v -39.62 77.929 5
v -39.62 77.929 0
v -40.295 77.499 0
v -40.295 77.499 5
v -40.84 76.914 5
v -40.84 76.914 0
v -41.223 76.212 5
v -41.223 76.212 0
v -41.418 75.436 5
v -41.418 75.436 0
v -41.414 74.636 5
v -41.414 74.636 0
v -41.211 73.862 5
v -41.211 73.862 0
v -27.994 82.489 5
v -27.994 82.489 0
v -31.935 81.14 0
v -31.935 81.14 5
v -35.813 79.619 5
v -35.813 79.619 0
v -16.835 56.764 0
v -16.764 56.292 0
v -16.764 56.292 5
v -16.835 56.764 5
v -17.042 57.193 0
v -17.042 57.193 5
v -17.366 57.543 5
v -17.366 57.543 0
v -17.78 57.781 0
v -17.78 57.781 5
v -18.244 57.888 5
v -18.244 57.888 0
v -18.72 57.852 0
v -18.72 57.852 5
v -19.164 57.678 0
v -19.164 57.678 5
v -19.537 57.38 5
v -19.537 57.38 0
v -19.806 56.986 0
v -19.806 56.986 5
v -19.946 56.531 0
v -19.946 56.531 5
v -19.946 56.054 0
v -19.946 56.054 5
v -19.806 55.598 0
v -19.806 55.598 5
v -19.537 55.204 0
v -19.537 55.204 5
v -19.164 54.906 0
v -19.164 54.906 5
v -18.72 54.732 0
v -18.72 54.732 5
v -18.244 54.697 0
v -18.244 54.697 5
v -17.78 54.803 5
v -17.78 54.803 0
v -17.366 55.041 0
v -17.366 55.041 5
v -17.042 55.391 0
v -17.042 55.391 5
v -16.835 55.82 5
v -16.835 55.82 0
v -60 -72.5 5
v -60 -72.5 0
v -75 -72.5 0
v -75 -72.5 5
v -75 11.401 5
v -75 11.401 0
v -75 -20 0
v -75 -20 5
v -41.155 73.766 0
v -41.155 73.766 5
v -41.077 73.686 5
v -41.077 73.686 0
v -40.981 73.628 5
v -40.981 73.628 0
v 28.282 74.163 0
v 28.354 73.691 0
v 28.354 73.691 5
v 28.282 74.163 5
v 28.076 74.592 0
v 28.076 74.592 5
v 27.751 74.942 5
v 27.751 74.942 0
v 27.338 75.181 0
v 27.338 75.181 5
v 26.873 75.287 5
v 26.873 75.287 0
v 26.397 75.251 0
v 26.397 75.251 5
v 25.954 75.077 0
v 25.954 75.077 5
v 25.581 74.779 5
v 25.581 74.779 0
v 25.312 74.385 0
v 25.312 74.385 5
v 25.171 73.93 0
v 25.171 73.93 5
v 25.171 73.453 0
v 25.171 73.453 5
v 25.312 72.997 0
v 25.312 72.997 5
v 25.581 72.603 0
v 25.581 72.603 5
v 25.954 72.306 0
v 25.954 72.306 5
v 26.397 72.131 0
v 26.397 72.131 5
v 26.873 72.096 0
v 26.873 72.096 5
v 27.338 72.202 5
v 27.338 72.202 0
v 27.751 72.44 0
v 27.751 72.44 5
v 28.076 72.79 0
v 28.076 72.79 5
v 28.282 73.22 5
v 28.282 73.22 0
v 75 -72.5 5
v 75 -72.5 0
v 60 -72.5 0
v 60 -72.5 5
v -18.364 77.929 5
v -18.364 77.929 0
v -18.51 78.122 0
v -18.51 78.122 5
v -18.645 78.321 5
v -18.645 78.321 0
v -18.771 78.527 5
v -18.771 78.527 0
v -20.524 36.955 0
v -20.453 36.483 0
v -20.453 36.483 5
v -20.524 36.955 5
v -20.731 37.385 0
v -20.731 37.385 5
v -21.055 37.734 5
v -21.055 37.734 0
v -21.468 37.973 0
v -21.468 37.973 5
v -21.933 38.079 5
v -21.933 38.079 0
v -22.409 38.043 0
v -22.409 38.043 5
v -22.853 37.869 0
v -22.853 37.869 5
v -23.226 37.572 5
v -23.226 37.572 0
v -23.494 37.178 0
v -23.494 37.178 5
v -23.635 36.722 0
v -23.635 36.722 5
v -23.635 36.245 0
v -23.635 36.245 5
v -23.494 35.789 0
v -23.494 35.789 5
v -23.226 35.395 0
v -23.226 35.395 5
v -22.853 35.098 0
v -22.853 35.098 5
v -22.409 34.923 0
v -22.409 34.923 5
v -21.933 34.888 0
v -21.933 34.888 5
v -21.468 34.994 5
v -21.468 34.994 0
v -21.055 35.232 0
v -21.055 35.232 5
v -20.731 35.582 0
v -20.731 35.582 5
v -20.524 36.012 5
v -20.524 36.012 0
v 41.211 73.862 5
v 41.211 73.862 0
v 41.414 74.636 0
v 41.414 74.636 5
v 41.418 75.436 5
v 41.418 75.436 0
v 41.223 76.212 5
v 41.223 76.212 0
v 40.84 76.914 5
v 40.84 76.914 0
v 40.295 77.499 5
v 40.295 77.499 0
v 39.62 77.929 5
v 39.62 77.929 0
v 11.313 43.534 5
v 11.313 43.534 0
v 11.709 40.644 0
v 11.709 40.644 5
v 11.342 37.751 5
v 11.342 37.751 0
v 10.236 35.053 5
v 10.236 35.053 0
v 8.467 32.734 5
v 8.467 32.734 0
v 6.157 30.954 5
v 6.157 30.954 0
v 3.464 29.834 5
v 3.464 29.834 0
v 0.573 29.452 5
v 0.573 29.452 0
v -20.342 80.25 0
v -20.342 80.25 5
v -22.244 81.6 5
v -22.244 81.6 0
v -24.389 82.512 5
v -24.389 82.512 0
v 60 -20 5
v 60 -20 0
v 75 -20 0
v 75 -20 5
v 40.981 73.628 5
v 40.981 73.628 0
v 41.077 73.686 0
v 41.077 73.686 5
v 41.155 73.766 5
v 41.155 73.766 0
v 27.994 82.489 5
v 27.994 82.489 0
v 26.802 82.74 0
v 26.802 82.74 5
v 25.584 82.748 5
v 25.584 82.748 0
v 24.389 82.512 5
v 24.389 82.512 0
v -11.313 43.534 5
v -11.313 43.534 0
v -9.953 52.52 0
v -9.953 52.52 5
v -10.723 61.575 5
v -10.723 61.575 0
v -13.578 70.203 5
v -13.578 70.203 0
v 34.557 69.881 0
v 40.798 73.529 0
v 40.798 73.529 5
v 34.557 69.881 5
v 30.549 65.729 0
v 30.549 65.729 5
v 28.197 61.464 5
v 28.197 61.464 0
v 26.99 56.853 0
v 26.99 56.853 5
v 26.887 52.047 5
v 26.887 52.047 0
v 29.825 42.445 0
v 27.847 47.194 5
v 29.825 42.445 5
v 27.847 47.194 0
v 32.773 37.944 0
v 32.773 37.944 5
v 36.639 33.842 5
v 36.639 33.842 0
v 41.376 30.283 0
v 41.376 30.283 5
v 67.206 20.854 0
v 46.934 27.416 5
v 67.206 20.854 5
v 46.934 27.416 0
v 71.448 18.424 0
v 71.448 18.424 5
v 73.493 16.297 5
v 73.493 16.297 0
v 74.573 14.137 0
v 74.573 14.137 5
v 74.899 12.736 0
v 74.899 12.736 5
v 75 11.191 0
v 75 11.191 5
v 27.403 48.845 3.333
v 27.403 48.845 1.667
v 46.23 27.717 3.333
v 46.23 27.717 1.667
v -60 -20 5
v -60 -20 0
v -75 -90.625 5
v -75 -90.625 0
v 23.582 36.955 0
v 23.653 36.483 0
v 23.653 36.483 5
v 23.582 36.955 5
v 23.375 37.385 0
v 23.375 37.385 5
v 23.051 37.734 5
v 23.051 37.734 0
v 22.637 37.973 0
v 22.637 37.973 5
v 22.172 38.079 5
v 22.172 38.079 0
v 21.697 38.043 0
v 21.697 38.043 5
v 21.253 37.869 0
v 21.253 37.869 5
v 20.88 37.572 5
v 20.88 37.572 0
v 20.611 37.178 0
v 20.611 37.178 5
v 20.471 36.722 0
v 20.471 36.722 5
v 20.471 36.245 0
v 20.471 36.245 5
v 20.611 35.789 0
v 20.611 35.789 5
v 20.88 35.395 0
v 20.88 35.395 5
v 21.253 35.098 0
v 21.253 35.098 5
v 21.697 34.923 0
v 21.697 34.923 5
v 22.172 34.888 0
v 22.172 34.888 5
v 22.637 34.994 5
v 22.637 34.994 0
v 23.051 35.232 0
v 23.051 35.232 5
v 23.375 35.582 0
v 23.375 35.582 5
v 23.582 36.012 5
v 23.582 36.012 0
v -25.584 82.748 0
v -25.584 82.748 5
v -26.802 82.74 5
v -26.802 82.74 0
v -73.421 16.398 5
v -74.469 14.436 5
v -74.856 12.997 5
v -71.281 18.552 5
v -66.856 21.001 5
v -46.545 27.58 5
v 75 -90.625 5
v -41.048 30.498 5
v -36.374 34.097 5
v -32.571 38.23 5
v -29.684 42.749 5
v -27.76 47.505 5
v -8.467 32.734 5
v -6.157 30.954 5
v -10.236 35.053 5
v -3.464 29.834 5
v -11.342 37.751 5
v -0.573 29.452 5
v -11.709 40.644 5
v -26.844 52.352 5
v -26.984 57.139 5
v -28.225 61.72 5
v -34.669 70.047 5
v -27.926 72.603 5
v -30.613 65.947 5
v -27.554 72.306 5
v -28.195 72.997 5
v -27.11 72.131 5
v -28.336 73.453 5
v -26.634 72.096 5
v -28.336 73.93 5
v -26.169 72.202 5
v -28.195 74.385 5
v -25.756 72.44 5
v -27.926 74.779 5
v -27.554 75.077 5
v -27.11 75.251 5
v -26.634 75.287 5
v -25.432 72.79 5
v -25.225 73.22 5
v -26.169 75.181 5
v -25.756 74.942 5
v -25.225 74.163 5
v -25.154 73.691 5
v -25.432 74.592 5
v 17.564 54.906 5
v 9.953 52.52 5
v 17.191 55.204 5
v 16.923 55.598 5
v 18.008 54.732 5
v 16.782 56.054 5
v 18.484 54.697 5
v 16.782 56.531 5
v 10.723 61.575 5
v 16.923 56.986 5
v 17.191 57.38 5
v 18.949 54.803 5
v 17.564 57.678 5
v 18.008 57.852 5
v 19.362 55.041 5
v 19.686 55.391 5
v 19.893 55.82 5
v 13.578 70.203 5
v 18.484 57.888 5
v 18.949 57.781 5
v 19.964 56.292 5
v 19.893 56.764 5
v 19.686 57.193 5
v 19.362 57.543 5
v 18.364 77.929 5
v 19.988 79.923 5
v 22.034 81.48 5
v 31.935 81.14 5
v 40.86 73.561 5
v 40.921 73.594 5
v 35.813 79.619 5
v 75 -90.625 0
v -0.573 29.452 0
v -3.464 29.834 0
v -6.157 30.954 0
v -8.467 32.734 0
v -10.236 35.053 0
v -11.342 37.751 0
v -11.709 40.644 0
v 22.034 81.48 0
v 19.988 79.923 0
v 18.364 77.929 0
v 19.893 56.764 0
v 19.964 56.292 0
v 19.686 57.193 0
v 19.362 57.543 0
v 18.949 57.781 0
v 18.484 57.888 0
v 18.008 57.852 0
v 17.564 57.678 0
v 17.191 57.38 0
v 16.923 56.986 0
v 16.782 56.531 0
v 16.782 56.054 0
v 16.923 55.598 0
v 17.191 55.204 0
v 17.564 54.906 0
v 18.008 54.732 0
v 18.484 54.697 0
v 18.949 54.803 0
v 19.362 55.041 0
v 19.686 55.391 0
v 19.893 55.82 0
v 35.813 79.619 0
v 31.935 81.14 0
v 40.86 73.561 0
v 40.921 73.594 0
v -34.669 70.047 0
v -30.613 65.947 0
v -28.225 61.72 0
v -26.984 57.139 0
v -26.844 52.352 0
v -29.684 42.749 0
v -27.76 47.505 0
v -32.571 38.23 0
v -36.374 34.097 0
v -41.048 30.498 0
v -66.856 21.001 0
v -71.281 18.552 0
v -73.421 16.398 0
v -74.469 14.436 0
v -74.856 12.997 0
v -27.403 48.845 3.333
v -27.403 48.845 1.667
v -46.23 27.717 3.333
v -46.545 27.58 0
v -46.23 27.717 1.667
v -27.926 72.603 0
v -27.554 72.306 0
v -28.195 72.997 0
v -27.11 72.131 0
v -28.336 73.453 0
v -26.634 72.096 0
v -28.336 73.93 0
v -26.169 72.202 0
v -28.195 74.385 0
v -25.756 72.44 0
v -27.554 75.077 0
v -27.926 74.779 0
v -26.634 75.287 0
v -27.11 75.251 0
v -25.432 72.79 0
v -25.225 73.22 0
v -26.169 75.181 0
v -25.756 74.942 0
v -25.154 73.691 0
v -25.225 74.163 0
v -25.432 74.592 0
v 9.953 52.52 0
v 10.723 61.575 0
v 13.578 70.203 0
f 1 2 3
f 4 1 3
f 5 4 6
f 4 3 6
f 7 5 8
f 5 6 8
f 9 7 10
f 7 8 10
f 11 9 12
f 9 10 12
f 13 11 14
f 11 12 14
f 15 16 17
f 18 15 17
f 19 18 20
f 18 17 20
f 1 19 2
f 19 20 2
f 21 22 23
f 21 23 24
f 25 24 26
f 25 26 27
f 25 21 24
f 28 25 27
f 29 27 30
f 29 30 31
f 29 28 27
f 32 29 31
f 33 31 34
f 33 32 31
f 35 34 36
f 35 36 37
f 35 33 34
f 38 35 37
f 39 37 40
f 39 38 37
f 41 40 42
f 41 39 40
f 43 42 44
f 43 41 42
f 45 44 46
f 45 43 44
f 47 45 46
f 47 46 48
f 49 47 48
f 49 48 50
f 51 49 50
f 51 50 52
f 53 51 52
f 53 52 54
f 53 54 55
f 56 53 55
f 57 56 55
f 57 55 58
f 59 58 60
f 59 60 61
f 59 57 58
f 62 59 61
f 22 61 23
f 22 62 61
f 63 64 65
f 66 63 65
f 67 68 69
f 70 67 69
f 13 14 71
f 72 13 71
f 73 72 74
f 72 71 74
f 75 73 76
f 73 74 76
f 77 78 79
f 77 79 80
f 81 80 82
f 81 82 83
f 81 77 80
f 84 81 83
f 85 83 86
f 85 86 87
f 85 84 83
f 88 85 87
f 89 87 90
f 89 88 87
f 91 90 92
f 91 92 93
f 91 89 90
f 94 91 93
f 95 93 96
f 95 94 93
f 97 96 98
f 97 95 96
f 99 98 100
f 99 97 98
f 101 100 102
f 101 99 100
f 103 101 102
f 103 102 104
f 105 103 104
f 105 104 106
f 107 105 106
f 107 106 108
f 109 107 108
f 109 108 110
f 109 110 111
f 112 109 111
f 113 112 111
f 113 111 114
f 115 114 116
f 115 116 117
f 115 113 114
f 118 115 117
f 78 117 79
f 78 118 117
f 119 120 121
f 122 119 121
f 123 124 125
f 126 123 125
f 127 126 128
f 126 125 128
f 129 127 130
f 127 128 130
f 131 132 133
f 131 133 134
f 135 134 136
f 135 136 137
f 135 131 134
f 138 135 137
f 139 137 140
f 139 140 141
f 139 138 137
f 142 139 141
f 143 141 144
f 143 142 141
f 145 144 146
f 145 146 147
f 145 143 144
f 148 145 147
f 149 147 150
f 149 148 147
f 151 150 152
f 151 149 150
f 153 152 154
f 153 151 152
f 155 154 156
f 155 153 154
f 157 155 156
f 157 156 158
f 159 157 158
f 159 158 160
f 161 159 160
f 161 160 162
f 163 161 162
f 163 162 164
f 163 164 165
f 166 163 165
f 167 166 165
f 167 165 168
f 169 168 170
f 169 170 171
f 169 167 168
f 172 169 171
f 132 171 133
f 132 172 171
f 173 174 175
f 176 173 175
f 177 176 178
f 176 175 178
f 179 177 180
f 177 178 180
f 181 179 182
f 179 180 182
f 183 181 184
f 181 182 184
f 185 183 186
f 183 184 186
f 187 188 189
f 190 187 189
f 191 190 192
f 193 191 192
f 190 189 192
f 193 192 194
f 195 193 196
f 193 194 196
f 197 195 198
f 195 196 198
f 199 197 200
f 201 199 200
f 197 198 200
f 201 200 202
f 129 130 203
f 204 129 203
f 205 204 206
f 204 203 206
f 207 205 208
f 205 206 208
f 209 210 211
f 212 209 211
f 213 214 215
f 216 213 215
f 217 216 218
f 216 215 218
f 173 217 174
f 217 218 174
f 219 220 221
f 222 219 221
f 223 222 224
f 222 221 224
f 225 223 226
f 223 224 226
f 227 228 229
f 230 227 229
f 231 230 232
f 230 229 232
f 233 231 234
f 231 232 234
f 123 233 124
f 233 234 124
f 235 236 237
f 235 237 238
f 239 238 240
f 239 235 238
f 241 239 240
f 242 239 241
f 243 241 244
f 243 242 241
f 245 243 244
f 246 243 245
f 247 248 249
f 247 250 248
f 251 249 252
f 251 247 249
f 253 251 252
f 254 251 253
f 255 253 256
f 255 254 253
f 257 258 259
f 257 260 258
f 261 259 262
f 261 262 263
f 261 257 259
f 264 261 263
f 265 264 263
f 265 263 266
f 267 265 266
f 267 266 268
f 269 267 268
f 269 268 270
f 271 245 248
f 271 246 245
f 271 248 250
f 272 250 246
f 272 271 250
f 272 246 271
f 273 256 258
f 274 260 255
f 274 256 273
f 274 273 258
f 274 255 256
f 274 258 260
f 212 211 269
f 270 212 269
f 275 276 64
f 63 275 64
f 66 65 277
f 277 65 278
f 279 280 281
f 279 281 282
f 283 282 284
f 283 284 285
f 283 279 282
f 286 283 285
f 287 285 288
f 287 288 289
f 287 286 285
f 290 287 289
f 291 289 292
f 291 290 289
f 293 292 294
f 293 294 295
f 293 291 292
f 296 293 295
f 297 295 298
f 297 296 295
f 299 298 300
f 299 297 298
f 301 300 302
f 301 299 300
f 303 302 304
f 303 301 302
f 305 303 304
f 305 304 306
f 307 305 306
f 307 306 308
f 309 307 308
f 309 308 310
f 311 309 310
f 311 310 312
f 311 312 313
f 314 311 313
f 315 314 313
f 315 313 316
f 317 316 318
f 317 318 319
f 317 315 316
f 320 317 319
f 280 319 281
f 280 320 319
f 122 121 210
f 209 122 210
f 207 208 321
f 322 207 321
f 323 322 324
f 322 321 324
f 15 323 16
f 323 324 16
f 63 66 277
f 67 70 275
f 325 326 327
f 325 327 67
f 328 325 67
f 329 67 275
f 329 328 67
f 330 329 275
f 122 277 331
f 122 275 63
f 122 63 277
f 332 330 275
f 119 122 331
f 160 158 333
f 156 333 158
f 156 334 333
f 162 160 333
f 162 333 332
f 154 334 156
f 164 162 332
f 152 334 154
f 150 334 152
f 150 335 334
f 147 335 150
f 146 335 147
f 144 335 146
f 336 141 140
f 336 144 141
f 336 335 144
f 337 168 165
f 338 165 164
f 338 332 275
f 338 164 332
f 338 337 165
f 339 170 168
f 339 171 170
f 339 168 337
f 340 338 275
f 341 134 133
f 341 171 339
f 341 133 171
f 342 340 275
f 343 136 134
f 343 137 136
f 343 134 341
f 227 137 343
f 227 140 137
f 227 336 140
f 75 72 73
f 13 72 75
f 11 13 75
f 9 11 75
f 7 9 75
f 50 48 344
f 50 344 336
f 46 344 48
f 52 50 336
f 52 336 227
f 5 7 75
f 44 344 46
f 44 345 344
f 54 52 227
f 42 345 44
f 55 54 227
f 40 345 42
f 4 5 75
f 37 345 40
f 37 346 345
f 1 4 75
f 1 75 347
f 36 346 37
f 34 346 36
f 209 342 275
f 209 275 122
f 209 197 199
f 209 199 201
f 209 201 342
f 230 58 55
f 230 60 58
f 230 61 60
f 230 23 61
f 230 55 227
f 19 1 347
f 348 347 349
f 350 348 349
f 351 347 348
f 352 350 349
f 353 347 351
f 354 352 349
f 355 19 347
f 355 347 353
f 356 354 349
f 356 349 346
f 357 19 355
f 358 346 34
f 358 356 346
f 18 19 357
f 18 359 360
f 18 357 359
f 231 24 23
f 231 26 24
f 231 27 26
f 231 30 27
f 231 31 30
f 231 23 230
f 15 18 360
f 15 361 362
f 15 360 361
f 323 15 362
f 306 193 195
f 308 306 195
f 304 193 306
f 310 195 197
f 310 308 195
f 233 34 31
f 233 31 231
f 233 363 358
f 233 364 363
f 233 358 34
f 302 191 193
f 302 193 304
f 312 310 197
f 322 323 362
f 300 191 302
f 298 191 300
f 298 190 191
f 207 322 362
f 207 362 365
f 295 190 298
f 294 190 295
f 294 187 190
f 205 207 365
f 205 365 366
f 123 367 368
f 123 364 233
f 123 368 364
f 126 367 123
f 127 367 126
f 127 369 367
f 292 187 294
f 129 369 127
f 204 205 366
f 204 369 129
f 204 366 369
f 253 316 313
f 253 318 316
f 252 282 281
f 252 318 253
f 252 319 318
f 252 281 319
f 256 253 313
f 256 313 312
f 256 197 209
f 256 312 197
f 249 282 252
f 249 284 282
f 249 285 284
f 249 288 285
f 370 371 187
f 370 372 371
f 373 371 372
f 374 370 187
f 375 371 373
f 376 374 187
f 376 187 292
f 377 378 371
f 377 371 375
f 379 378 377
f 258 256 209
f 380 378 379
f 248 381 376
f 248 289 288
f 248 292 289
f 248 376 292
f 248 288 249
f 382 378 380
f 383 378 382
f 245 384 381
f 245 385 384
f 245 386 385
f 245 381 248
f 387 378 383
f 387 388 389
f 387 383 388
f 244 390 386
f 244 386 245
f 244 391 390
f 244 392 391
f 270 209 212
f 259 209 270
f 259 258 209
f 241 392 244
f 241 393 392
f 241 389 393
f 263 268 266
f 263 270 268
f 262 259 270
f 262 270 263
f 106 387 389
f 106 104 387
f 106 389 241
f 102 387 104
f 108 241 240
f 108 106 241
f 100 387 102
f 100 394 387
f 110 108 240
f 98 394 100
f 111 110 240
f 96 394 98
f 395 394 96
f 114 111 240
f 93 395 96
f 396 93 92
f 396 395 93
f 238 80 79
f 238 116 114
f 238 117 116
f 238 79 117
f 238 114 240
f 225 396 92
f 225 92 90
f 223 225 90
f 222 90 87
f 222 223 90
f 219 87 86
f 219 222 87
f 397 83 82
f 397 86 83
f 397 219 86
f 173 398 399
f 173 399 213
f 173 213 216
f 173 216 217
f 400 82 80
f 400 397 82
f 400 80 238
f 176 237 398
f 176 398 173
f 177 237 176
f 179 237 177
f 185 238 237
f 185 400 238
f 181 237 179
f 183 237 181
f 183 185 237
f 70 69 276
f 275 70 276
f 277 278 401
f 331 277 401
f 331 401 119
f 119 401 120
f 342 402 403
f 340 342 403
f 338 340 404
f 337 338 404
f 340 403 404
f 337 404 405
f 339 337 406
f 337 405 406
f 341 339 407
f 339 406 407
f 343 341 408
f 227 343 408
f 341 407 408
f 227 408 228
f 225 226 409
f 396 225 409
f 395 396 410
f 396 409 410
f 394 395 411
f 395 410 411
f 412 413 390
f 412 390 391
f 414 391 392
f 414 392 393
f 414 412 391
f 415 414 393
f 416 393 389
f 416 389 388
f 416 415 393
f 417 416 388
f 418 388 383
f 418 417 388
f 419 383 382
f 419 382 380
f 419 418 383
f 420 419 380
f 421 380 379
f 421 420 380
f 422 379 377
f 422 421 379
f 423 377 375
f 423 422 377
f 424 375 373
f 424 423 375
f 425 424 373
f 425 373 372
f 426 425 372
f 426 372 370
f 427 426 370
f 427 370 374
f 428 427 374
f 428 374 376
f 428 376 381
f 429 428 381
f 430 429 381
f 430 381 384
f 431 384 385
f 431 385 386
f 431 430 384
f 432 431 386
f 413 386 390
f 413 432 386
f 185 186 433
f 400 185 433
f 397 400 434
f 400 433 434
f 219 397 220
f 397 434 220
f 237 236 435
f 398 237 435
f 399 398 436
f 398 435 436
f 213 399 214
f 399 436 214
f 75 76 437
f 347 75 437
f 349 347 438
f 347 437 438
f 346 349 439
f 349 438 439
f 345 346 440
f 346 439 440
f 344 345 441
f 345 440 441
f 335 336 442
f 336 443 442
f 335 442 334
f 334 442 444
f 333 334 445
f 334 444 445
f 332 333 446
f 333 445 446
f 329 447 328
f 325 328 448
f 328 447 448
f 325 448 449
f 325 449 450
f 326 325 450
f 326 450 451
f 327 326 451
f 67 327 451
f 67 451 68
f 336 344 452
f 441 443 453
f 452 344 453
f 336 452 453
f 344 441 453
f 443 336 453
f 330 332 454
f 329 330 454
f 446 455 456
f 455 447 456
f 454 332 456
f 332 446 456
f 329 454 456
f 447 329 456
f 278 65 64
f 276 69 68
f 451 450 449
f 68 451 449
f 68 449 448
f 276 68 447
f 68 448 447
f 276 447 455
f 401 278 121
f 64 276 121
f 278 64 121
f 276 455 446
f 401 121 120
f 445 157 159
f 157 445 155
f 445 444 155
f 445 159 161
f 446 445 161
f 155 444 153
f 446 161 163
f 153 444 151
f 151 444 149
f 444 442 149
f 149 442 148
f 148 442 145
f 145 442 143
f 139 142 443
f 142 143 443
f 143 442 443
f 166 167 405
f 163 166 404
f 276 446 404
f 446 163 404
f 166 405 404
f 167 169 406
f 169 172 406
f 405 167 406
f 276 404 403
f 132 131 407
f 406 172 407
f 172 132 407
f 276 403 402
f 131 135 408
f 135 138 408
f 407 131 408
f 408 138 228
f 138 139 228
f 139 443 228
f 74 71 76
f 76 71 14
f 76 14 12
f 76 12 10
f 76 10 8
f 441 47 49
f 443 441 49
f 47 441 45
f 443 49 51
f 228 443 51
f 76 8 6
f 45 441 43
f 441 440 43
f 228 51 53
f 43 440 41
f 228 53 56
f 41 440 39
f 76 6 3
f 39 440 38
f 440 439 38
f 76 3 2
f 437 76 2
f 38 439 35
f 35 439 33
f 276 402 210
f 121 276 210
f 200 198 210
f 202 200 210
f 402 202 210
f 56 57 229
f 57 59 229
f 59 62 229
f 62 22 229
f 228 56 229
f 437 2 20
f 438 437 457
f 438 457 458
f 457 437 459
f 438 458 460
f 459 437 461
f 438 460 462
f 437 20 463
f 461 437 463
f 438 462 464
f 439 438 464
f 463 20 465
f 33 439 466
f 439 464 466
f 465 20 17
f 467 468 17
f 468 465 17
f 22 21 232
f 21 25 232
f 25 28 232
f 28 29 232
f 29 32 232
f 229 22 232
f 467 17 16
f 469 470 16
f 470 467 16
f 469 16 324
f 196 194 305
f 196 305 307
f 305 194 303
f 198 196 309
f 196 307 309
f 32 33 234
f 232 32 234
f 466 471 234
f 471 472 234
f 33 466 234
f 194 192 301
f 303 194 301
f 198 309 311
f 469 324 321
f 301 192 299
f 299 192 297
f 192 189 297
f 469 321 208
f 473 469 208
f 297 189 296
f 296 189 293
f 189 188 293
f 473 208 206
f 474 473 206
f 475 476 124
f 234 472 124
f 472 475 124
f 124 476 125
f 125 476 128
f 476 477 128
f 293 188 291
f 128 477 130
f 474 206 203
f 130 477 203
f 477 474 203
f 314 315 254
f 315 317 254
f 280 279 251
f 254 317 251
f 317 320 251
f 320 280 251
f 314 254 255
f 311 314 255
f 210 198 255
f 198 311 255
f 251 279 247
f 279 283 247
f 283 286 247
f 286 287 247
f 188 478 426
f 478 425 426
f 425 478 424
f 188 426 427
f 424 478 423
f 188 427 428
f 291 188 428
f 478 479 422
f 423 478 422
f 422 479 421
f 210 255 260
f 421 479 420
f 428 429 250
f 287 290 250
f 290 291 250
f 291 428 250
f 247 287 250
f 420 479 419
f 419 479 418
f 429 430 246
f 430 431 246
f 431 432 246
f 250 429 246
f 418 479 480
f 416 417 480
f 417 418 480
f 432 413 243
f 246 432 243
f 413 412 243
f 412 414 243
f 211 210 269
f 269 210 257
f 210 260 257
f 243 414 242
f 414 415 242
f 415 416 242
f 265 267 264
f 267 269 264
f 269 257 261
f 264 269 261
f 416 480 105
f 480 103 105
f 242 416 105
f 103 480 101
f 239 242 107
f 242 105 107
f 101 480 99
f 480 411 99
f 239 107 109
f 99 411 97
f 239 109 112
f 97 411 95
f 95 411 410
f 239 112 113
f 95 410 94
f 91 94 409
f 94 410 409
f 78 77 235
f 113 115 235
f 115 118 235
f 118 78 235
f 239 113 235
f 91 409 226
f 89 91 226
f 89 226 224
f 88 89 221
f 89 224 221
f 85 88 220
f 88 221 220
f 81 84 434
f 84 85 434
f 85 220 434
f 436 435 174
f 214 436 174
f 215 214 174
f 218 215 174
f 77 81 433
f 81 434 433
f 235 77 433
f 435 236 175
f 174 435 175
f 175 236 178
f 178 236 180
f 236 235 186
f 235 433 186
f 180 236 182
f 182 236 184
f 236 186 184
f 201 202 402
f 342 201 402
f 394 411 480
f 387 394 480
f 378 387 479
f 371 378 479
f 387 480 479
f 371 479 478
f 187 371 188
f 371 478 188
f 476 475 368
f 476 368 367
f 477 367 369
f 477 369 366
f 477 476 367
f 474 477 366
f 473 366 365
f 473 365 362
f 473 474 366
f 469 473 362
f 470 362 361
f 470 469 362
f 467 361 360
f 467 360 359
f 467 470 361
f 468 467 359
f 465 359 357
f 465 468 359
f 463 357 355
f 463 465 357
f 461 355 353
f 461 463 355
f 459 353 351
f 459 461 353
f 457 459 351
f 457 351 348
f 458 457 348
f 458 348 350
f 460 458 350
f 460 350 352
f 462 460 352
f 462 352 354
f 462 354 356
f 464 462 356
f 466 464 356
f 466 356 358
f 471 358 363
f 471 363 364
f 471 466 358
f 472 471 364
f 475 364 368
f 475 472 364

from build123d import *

# Parameters (mm, degrees)
SKETCH1_R           = 1.6
BOSS_EXTRUDE1_DEPTH = 5


with BuildPart() as part:
    # Sketch1 → Boss-Extrude1 (new body)
    with BuildSketch(Plane.XY):
        with BuildLine():
            Line((-75, -72.5), (-75, -90.625))
            Line((-75, -90.625), (75, -90.625))
            Line((75, -90.625), (75, -72.5))
            Line((75, -72.5), (60, -72.5))
            Line((60, -72.5), (60, -20))
            Line((60, -20), (75, -20))
            Line((75, -20), (75, 11.191407718))
            add(Edge.make_bspline(
                [(40.797859307, 73.529184669), (29.113413748, 68.584091893), (21.698756749, 49.837173387), (43.872198756, 22.538291001), (75.106478131, 22.355404036), (75, 11.191407718)],
                knots=[0.187825193, 0.187825193, 0.187825193, 0.187825193, 0.468621415, 0.712802941, 1, 1, 1, 1], degree=3))
            ThreePointArc((40.797859307, 73.529184669), (40.890658025, 73.576842128), (40.981293421, 73.628495399))
            ThreePointArc((40.981293421, 73.628495399), (41.118145392, 73.723771319), (41.210746684, 73.862447067))
            ThreePointArc((41.210746684, 73.862447067), (41.223041239, 76.211736408), (39.620297917, 77.929445758))
            ThreePointArc((39.620297917, 77.929445758), (33.882326143, 80.400449206), (27.994286118, 82.488788925))
            ThreePointArc((27.994286118, 82.488788925), (26.19343045, 82.774292897), (24.38900087, 82.512324293))
            ThreePointArc((24.38900087, 82.512324293), (20.964990276, 80.761920244), (18.364057527, 77.929445758))
            ThreePointArc((18.364057527, 77.929445758), (10.722602644, 61.575298771), (11.31305575, 43.533643593))
            ThreePointArc((11.31305575, 43.533643593), (9.427933785, 33.83519482), (0.573242194, 29.452498133))
            Line((0.573242194, 29.452498133), (-0.573242194, 29.452498133))
            ThreePointArc((-0.573242194, 29.452498133), (-9.427933785, 33.83519482), (-11.31305575, 43.533643593))
            ThreePointArc((-11.31305575, 43.533643593), (-10.722602644, 61.575298771), (-18.364057527, 77.929445758))
            ThreePointArc((-18.364057527, 77.929445758), (-18.578745667, 78.220711537), (-18.771416352, 78.526987162))
            ThreePointArc((-18.771416352, 78.526987162), (-21.256426114, 80.976047617), (-24.38900087, 82.512324293))
            ThreePointArc((-24.38900087, 82.512324293), (-26.19343045, 82.774292897), (-27.994286118, 82.488788925))
            ThreePointArc((-27.994286118, 82.488788925), (-33.882326143, 80.400449206), (-39.620297917, 77.929445758))
            ThreePointArc((-39.620297917, 77.929445758), (-41.223041239, 76.211736408), (-41.210746684, 73.862447067))
            ThreePointArc((-41.210746684, 73.862447067), (-41.118145392, 73.723771319), (-40.981293421, 73.628495399))
            add(Edge.make_bspline(
                [(-40.981293421, 73.628495399), (-29.036410535, 68.745777574), (-21.682695552, 49.95343828), (-43.802890071, 22.593157589), (-74.894409224, 22.356830762), (-75, 11.400592909)],
                knots=[0.184913023, 0.184913023, 0.184913023, 0.184913023, 0.468621415, 0.712802941, 0.998195008, 0.998195008, 0.998195008, 0.998195008], degree=3))
            Line((-75, 11.400592909), (-75, 11.191407718))
            Line((-75, 11.191407718), (-75, -20))
            Line((-75, -20), (-60, -20))
            Line((-60, -20), (-60, -72.5))
            Line((-60, -72.5), (-75, -72.5))
        make_face()
        with Locations((-22.052924911, 36.483296004)):
            Circle(SKETCH1_R, mode=Mode.SUBTRACT)
        with Locations((-18.364057527, 56.292076909)):
            Circle(SKETCH1_R, mode=Mode.SUBTRACT)
        with Locations((-26.753522246, 73.691170186)):
            Circle(SKETCH1_R, mode=Mode.SUBTRACT)
        with Locations((22.052924911, 36.483296004)):
            Circle(SKETCH1_R, mode=Mode.SUBTRACT)
        with Locations((18.364057527, 56.292076909)):
            Circle(SKETCH1_R, mode=Mode.SUBTRACT)
        with Locations((26.753522246, 73.691170186)):
            Circle(SKETCH1_R, mode=Mode.SUBTRACT)
    extrude(amount=BOSS_EXTRUDE1_DEPTH)


solid = part.part
